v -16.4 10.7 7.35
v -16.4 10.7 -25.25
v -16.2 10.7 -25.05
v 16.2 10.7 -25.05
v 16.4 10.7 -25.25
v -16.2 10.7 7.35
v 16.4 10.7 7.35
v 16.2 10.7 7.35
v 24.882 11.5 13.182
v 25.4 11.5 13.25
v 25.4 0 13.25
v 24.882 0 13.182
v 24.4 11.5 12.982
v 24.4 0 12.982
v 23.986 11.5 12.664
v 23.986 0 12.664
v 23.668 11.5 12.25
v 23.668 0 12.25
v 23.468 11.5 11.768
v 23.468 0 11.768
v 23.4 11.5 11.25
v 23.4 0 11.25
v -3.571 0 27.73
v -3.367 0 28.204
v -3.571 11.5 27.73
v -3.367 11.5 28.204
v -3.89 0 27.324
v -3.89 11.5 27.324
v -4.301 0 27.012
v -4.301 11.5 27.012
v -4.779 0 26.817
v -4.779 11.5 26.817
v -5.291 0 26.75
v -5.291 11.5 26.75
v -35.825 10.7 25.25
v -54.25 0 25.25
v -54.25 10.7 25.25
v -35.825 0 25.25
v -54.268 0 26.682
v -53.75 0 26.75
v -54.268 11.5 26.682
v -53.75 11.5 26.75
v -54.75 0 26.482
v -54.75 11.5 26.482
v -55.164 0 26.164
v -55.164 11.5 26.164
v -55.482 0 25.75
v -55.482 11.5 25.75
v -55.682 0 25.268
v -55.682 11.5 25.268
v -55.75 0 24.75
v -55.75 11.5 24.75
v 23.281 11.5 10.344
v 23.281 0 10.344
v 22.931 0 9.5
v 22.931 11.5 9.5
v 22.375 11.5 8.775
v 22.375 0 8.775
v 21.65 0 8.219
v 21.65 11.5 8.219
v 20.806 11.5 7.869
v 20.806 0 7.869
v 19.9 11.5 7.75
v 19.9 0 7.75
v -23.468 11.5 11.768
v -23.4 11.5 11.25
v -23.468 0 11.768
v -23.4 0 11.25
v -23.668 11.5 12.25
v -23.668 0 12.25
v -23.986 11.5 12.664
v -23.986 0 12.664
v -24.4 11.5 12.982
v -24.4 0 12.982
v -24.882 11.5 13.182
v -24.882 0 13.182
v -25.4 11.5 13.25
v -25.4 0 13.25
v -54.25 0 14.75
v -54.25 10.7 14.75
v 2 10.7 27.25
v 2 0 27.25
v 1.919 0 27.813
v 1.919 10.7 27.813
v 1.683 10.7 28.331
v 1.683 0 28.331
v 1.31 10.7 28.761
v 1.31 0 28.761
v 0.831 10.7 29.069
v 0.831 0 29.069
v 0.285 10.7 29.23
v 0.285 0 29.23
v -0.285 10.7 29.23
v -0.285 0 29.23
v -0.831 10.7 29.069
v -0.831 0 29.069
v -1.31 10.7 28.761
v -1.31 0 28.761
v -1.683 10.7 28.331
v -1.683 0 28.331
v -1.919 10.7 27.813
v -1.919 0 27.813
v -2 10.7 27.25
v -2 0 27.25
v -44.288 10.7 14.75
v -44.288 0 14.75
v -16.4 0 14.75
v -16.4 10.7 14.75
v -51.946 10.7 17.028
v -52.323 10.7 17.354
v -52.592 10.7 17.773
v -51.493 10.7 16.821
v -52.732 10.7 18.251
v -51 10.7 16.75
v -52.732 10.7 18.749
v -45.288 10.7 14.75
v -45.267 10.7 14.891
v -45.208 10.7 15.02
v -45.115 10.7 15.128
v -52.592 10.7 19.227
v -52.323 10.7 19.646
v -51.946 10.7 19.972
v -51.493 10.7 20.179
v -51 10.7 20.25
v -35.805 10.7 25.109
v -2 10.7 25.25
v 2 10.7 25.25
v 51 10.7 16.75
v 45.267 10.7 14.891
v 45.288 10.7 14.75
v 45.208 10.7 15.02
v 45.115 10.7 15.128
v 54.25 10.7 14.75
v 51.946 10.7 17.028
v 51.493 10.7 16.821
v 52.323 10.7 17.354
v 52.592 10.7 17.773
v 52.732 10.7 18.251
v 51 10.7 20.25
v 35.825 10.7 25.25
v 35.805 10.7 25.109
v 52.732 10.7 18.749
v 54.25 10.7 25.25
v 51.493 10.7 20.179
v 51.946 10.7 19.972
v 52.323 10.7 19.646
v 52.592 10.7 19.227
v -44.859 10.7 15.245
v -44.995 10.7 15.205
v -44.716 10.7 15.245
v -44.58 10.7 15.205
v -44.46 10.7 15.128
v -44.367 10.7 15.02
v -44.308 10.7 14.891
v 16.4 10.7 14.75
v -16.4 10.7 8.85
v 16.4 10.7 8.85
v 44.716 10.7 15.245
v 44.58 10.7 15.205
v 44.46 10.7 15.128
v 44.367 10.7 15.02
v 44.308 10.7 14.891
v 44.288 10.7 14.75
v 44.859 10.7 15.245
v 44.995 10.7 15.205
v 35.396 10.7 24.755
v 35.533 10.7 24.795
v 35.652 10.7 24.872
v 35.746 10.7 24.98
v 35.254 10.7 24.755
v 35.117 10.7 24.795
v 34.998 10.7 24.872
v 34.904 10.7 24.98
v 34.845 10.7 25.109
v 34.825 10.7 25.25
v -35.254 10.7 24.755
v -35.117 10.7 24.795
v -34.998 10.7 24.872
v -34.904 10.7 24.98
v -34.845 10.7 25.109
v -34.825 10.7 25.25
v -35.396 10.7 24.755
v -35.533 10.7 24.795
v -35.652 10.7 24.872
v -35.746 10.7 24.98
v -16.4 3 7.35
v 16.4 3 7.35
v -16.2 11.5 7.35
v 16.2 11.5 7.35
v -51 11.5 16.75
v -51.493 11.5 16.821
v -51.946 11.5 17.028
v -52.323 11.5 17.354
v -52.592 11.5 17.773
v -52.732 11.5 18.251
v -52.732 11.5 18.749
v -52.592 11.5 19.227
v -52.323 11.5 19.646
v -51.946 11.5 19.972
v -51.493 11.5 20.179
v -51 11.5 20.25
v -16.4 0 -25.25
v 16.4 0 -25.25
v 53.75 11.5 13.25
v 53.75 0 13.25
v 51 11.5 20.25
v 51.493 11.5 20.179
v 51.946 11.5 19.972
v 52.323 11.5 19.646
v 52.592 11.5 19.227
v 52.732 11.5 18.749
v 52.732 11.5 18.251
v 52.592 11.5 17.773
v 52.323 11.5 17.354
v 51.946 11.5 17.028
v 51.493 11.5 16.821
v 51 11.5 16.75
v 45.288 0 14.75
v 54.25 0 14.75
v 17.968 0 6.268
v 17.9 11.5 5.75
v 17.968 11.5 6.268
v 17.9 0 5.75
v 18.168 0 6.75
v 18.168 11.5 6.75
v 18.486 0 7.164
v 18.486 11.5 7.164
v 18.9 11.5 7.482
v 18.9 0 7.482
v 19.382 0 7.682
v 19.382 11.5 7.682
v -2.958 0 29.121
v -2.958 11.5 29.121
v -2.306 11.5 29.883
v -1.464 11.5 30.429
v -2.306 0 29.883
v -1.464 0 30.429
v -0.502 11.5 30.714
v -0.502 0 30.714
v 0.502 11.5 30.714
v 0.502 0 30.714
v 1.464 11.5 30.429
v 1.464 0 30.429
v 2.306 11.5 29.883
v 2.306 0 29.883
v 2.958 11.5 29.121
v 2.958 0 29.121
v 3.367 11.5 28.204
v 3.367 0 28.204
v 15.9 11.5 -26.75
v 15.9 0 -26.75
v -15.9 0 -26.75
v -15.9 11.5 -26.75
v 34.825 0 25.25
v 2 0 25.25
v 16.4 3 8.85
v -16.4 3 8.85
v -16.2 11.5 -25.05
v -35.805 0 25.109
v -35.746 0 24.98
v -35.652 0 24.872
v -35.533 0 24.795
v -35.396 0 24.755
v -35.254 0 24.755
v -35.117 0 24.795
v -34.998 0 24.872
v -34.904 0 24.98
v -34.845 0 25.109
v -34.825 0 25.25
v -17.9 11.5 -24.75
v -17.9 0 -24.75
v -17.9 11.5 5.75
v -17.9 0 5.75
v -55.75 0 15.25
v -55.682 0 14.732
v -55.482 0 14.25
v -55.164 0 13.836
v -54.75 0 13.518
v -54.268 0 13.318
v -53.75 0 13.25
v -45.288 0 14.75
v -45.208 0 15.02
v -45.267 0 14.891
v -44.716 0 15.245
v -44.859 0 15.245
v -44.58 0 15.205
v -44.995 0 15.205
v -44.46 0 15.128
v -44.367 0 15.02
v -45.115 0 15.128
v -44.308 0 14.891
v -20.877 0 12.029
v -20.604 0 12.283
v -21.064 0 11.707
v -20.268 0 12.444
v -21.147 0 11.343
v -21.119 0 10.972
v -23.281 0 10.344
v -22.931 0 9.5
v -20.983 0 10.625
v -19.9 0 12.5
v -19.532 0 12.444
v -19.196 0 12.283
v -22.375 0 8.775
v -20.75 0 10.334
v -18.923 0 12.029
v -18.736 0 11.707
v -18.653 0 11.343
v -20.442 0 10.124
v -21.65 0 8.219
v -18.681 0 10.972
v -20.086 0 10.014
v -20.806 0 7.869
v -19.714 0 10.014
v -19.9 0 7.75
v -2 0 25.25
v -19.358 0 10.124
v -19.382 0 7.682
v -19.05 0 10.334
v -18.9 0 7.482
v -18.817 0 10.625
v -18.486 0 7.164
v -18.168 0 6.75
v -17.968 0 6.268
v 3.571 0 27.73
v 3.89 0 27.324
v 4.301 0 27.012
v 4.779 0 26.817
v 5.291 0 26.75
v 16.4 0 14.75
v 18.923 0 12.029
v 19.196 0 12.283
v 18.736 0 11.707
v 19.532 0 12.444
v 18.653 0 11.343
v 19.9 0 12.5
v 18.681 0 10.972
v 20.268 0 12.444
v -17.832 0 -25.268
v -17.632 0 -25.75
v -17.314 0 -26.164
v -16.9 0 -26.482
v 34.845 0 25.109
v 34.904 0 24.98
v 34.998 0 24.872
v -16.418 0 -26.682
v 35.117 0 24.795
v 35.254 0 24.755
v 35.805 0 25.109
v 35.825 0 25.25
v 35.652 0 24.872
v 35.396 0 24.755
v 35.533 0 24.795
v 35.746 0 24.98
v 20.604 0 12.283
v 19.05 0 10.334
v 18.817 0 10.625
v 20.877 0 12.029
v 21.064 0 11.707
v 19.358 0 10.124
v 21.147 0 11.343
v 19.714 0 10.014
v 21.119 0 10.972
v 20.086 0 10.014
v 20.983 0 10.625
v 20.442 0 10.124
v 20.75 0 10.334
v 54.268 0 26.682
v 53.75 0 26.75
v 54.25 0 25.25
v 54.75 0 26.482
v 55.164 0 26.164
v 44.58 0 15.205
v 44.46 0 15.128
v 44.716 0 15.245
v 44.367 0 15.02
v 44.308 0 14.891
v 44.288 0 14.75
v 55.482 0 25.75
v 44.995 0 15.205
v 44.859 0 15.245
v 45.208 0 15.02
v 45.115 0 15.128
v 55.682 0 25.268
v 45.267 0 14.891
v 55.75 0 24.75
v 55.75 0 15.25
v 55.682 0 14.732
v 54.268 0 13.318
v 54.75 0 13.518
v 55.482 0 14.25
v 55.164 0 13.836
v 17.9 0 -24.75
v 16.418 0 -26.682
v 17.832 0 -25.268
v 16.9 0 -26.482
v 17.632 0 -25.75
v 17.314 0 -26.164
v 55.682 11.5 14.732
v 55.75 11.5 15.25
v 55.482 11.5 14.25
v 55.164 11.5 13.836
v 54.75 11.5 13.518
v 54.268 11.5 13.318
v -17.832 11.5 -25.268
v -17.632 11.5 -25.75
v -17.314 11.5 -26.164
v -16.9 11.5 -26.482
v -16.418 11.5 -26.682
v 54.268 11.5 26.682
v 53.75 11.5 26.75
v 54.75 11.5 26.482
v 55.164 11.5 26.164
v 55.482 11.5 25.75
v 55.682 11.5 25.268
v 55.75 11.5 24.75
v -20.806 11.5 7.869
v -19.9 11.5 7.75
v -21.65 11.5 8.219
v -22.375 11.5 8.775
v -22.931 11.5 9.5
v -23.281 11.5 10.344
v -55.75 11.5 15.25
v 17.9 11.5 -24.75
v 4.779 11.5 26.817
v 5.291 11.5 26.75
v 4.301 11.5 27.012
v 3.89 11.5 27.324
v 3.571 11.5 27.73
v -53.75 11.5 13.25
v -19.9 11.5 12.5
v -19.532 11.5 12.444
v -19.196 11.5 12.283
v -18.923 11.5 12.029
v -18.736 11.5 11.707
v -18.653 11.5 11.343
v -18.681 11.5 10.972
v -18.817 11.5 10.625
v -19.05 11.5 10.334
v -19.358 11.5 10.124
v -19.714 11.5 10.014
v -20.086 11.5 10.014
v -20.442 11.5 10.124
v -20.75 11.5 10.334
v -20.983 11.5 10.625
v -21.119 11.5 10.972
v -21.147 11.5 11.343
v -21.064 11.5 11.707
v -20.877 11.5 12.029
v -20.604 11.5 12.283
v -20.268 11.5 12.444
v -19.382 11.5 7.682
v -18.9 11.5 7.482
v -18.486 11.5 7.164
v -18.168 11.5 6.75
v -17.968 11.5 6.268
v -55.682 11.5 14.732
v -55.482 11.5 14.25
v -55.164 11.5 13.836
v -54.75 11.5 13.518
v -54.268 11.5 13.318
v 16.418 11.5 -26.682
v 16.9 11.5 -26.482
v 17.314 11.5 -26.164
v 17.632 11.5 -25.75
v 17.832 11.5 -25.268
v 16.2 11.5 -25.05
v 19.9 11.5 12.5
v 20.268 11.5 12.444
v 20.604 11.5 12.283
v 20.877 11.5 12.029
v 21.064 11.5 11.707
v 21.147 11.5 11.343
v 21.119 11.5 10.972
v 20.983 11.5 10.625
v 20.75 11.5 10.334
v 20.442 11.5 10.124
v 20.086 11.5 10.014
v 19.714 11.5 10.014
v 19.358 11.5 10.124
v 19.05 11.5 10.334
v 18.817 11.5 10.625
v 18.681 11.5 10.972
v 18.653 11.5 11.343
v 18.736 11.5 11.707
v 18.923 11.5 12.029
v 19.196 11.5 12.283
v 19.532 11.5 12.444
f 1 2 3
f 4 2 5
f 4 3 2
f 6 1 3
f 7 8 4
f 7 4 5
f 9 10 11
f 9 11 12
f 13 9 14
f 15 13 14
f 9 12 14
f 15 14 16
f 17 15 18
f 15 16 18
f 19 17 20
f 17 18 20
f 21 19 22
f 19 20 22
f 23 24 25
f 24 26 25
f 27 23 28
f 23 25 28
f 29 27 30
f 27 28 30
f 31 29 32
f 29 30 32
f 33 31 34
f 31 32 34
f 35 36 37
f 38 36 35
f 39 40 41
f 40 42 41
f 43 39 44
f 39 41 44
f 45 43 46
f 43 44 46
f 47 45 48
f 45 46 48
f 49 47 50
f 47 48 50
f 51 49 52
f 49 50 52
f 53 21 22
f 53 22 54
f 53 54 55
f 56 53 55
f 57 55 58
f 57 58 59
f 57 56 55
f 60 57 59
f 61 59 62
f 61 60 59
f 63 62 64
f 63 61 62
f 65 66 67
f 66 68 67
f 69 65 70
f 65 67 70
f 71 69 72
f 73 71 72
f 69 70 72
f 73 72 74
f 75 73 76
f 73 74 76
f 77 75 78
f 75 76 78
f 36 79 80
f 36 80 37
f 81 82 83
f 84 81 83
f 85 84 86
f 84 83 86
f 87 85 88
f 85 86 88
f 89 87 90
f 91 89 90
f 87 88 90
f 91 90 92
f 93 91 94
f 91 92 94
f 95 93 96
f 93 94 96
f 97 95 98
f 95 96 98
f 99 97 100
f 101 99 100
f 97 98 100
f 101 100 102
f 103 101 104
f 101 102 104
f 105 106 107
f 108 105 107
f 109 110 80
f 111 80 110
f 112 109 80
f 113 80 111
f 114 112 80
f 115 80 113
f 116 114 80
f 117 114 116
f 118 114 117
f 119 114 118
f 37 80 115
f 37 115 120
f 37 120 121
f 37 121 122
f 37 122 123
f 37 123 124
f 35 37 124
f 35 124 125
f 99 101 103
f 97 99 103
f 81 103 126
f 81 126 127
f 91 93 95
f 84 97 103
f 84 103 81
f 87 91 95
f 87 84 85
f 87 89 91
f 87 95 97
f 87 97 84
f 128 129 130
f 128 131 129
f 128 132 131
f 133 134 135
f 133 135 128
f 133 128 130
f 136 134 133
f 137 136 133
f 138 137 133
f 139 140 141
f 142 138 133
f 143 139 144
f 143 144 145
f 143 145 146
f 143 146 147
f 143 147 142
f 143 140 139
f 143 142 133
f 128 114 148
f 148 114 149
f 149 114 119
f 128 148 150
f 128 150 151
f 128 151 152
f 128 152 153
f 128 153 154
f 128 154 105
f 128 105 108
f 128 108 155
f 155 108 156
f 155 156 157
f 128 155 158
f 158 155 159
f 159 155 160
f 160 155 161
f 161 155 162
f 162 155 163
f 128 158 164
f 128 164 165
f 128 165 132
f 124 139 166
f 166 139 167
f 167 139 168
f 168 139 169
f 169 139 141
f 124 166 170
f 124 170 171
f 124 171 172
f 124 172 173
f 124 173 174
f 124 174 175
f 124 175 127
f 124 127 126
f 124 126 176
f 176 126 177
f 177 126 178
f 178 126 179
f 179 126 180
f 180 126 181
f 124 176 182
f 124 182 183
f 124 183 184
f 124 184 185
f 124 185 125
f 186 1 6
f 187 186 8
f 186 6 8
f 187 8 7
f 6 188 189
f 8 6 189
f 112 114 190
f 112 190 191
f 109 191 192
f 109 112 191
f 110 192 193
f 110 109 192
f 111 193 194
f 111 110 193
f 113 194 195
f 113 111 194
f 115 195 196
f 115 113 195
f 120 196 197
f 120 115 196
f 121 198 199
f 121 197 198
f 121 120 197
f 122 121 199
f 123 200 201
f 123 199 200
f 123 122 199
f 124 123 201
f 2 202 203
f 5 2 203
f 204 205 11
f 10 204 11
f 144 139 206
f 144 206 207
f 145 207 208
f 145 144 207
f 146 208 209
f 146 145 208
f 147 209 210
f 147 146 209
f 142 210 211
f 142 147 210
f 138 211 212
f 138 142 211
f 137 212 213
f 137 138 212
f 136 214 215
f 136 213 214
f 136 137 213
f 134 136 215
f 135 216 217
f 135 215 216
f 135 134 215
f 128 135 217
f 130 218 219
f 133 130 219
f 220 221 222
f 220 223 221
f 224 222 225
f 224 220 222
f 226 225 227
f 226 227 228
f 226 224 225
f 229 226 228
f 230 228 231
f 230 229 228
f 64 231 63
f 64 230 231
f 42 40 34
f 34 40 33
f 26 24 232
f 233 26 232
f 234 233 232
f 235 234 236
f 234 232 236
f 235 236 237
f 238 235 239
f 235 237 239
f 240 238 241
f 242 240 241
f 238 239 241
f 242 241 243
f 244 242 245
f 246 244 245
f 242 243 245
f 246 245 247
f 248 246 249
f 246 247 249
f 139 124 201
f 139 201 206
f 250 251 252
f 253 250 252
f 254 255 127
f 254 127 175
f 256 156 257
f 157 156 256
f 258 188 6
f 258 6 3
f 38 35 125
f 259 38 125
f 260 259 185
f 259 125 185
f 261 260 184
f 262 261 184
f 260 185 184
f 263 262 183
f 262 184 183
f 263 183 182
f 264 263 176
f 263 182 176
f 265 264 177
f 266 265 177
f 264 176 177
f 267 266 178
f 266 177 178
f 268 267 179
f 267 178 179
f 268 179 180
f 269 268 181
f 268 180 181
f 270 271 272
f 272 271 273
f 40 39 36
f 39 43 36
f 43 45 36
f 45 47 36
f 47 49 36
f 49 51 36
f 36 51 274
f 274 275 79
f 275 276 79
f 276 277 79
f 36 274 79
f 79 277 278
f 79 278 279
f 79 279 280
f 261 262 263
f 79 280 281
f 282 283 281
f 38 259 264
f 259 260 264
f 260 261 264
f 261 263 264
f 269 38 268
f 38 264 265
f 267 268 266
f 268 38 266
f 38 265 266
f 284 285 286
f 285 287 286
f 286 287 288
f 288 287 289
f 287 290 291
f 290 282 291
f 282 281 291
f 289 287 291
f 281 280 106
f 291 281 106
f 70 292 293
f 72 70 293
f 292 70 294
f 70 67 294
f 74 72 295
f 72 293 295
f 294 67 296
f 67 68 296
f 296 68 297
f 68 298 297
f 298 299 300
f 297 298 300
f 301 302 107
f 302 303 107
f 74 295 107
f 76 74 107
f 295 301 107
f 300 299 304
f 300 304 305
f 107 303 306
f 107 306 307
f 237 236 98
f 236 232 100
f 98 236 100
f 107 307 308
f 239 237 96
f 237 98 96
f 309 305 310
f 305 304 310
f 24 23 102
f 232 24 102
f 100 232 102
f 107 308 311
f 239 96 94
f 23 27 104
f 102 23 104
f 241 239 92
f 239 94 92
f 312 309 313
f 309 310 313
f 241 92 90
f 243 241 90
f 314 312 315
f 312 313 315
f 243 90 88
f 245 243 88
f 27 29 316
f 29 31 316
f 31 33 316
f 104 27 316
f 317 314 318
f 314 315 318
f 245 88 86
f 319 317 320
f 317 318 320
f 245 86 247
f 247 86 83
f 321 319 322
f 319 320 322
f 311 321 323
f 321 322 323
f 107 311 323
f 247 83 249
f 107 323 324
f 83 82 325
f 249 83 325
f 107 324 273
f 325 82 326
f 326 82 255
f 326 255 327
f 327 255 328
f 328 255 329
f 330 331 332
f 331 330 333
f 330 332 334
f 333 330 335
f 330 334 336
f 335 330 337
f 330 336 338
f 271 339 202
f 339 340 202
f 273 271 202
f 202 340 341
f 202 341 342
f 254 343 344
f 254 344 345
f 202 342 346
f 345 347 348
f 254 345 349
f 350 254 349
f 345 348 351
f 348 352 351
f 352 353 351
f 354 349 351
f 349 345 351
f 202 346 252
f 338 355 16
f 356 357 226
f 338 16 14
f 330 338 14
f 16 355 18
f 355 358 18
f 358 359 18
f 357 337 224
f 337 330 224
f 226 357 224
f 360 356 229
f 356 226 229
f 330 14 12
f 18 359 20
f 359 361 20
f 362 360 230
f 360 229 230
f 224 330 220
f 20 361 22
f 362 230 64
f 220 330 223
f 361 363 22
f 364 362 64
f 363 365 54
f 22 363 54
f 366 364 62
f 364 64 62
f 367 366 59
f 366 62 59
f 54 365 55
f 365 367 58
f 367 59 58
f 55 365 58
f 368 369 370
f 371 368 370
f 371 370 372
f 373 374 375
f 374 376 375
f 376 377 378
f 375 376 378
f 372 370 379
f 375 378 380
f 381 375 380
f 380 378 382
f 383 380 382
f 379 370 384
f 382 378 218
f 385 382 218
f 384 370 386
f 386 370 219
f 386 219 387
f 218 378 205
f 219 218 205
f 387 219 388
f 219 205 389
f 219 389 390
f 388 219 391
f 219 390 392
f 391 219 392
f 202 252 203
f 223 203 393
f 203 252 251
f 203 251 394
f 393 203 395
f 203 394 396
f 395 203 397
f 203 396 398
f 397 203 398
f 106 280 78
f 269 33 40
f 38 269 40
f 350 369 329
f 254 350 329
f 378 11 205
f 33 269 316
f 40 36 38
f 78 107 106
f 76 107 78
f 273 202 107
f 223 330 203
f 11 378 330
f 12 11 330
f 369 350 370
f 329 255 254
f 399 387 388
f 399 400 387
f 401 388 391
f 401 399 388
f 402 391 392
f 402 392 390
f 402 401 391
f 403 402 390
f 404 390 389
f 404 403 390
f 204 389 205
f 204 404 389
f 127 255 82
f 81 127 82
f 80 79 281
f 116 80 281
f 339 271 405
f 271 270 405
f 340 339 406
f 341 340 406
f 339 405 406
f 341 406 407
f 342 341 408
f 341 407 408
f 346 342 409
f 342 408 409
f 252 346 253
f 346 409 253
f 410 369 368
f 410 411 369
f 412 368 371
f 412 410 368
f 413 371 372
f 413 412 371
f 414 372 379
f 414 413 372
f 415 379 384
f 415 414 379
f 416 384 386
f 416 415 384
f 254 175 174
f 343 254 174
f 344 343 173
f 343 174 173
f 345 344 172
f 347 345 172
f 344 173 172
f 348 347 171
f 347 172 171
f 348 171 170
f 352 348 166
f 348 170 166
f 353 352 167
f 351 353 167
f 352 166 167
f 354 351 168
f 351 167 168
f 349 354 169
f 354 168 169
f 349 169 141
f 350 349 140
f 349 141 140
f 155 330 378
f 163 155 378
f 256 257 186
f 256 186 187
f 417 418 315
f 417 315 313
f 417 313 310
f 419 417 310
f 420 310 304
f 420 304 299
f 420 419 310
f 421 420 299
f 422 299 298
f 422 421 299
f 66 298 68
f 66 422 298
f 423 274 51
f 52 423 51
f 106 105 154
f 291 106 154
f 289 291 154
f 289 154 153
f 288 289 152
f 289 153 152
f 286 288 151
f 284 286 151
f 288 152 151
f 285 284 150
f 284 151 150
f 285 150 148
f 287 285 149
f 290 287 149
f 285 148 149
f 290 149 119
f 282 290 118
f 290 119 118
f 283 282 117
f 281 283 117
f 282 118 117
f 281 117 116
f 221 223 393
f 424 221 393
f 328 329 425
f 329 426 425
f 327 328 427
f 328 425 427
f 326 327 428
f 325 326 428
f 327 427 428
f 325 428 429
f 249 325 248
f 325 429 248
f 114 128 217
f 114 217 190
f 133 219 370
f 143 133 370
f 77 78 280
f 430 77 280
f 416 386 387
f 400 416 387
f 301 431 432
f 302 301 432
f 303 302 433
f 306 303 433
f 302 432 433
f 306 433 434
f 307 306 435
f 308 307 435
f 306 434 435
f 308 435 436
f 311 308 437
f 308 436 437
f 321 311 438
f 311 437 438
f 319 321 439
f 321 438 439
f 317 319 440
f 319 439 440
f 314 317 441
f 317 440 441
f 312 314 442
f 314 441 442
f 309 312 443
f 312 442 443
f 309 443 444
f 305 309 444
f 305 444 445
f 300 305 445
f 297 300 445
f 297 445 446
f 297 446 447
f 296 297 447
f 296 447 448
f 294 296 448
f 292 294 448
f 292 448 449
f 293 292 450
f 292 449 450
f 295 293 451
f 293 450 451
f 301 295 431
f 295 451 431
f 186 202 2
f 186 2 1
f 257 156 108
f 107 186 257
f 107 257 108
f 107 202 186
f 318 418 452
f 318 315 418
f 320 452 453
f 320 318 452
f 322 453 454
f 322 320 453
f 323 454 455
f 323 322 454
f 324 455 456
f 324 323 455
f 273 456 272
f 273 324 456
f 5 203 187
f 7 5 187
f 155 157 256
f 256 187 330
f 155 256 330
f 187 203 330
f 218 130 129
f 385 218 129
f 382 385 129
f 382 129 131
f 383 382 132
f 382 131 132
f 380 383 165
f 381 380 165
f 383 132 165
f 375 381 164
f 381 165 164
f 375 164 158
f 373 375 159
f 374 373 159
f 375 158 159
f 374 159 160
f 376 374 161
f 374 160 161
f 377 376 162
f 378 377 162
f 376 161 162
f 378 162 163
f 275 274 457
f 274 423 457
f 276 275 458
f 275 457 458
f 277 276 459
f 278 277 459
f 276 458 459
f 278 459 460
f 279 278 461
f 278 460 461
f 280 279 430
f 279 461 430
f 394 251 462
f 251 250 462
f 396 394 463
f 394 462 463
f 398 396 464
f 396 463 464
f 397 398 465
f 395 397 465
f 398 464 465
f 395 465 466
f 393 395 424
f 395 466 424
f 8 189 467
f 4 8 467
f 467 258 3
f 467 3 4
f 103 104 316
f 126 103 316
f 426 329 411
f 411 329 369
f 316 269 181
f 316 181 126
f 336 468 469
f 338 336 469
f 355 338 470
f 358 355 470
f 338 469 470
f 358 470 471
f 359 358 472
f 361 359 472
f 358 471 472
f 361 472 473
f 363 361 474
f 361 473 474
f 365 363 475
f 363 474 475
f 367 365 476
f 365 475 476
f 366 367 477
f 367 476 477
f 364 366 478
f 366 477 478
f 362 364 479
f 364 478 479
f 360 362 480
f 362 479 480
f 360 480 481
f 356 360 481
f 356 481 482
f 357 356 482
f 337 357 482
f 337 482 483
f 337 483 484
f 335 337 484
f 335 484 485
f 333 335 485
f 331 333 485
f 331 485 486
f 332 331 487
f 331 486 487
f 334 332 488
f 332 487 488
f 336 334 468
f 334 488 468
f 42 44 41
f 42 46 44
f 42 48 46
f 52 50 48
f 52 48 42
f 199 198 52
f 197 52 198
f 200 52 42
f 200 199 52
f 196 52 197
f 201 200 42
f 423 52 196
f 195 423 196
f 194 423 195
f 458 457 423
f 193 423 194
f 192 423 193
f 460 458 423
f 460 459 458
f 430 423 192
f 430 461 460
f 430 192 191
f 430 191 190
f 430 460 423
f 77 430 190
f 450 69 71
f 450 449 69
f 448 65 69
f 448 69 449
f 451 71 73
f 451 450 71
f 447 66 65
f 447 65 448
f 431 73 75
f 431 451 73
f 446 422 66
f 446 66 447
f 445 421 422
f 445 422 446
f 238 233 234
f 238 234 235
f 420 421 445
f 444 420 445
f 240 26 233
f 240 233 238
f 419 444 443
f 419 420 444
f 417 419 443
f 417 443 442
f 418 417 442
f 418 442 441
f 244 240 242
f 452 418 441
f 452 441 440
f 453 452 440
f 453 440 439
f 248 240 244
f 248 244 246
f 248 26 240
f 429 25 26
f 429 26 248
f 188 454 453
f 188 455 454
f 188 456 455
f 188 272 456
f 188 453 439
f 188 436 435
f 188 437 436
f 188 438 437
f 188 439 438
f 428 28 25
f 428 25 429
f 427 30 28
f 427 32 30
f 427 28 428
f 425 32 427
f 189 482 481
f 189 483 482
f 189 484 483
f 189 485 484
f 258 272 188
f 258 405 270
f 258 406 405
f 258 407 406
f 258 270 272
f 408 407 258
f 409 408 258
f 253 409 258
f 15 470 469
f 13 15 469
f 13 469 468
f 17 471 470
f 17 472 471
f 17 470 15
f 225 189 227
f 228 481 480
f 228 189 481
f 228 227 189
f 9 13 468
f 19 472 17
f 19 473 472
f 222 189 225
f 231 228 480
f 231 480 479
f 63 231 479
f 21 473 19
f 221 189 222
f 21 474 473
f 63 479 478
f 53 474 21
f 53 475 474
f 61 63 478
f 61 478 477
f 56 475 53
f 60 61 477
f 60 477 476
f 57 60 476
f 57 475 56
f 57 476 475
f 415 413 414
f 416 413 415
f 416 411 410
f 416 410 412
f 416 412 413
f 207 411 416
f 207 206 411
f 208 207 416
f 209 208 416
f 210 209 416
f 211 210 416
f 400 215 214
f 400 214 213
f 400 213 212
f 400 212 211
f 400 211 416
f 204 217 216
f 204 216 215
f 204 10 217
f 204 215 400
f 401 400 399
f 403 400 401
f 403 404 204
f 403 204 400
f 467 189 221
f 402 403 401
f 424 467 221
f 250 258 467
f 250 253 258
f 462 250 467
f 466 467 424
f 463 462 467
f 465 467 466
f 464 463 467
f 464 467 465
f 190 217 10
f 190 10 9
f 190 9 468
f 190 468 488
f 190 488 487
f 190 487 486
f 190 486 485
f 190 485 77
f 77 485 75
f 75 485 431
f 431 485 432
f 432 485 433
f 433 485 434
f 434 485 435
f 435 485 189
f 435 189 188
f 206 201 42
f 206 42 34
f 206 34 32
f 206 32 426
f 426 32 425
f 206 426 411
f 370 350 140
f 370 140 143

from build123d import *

# Parameters (mm, degrees)
BOSS_EXTRUDE1_DEPTH = 11.5
SKETCH2_W           = 32.4
SKETCH2_H           = 32.4
CUT_EXTRUDE1_DEPTH  = 8.7
SKETCH3_R           = 2
SKETCH3_W           = 108.5
SKETCH3_H           = 10.5
CUT_EXTRUDE2_DEPTH  = 10.7
CUT_EXTRUDE3_REACH  = 66.561
SKETCH5_W           = 32.8
SKETCH5_H           = 40
CUT_EXTRUDE4_DEPTH  = 10.7
SKETCH6_W           = 32.8
SKETCH6_H           = 1.5
BOSS_EXTRUDE2_DEPTH = 7.7
SKETCH8_R           = 2
SKETCH8_R_2         = 1.25
BOSS_EXTRUDE5_DEPTH = 11.5
FILLET1_R           = 2
SKETCH9_R           = 0.5
BOSS_EXTRUDE6_DEPTH = 10.7


with BuildPart() as part:
    # Sketch1 → Boss-Extrude1 (new body)
    with BuildSketch(Plane(origin=(0, 0, 0), x_dir=(1, 0, 0), z_dir=(0, 1, 0))):
        with BuildLine():
            Line((3.464101615, -26.75), (55.75, -26.75))
            Line((55.75, -26.75), (55.75, -13.25))
            Line((55.75, -13.25), (17.9, -13.25))
            Line((17.9, -13.25), (17.9, 26.75))
            Line((17.9, 26.75), (-17.9, 26.75))
            Line((-17.9, 26.75), (-17.9, -13.25))
            Line((-17.9, -13.25), (-55.75, -13.25))
            Line((-55.75, -13.25), (-55.75, -26.75))
            Line((-55.75, -26.75), (-3.464101615, -26.75))
            ThreePointArc((-3.464101615, -26.75), (0, -30.75), (3.464101615, -26.75))
        make_face()
    extrude(amount=BOSS_EXTRUDE1_DEPTH)

    # Sketch2 → Cut-Extrude1 (cut)
    with BuildSketch(Plane(origin=(0, 11.5, 0), x_dir=(1, 0, 0), z_dir=(0, 1, 0))):
        with Locations((0, 8.85)):
            Rectangle(SKETCH2_W, SKETCH2_H)
    extrude(amount=-CUT_EXTRUDE1_DEPTH, mode=Mode.SUBTRACT)

    # Sketch3 → Cut-Extrude2 (cut)
    with BuildSketch(Plane.XZ):
        with Locations((0, 27.25)):
            Circle(SKETCH3_R)
        with BuildLine():
            Line((-2, 27.25), (-2, 25.25))
            Line((-2, 25.25), (-1e-08, 25.25))
            ThreePointArc((-1e-08, 25.25), (-1.414213566, 25.835786441), (-2, 27.25))
        make_face()
        with BuildLine():
            ThreePointArc((2, 27.25), (1.414213559, 25.835786434), (-1e-08, 25.25))
            Line((-1e-08, 25.25), (2, 25.25))
            Line((2, 25.25), (2, 27.25))
        make_face()
        with Locations((0, 20)):
            Rectangle(SKETCH3_W, SKETCH3_H)
    extrude(amount=-CUT_EXTRUDE2_DEPTH, mode=Mode.SUBTRACT)

    # Sketch4 → Cut-Extrude3 (cut, up to next)
    with BuildSketch(Plane.XZ.offset(-10.7), mode=Mode.PRIVATE) as cut_extrude3_sk1:
        with BuildLine():
            Line((51, 16.75), (-51, 16.75))
            ThreePointArc((-51, 16.75), (-52.75, 18.5), (-51, 20.25))
            Line((-51, 20.25), (51, 20.25))
            ThreePointArc((51, 20.25), (52.75, 18.5), (51, 16.75))
        make_face()
    cut_extrude3_tool1 = extrude(cut_extrude3_sk1.sketch, amount=-CUT_EXTRUDE3_REACH, mode=Mode.PRIVATE) & part.part
    add(cut_extrude3_tool1.solids().sort_by_distance((0, 10.7, 18.5))[0], mode=Mode.SUBTRACT)

    # Sketch5 → Cut-Extrude4 (cut)
    with BuildSketch(Plane.XZ):
        with Locations((0, -5.25)):
            Rectangle(SKETCH5_W, SKETCH5_H)
    extrude(amount=-CUT_EXTRUDE4_DEPTH, mode=Mode.SUBTRACT)

    # Sketch6 → Boss-Extrude2 (add)
    with BuildSketch(Plane.XZ.offset(-10.7)):
        with Locations((0, 8.1)):
            Rectangle(SKETCH6_W, SKETCH6_H)
    extrude(amount=BOSS_EXTRUDE2_DEPTH)

    # Sketch8 → Boss-Extrude5 (add)
    # profile 1 of 10: a face of its own
    with BuildSketch(Plane(origin=(0, 11.5, 0), x_dir=(1, 0, 0), z_dir=(0, 1, 0))):
        with BuildLine():
            Line((-17.9, -7.75), (-19.9, -7.75))
            ThreePointArc((-19.9, -7.75), (-18.851902827, -7.910614979), (-17.9, -8.377718677))
            Line((-17.9, -8.377718677), (-17.9, -7.75))
        make_face()
    # profile 2 of 10: a face of its own
    with BuildSketch(Plane(origin=(0, 11.5, 0), x_dir=(1, 0, 0), z_dir=(0, 1, 0))):
        with BuildLine():
            ThreePointArc((-17.9, -8.377718677), (-18.851902827, -7.910614979), (-19.9, -7.75))
            ThreePointArc((-19.9, -7.75), (-22.374873734, -8.775126266), (-23.4, -11.25))
            ThreePointArc((-23.4, -11.25), (-23.239385021, -12.298097173), (-22.772281323, -13.25))
            Line((-22.772281323, -13.25), (-19.9, -13.25))
            ThreePointArc((-19.9, -13.25), (-21.314213562, -9.835786438), (-17.9, -11.25))
            Line((-17.9, -11.25), (-17.9, -8.377718677))
        make_face()
    # profile 3 of 10: a face of its own
    with BuildSketch(Plane(origin=(0, 11.5, 0), x_dir=(1, 0, 0), z_dir=(0, 1, 0))):
        with Locations((-19.9, -11.25)):
            Circle(SKETCH8_R)
        with Locations(Location((-19.9, -11.25, 0), (0, 0, 270))):
            Circle(SKETCH8_R_2, mode=Mode.SUBTRACT)
    # profile 4 of 10: a face of its own
    with BuildSketch(Plane(origin=(0, 11.5, 0), x_dir=(1, 0, 0), z_dir=(0, 1, 0))):
        with BuildLine():
            Line((-17.9, -13.25), (-17.9, -11.25))
            ThreePointArc((-17.9, -11.25), (-18.485786438, -12.664213562), (-19.9, -13.25))
            Line((-19.9, -13.25), (-17.9, -13.25))
        make_face()
    # profile 5 of 10: a face of its own
    with BuildSketch(Plane(origin=(0, 11.5, 0), x_dir=(1, 0, 0), z_dir=(0, 1, 0))):
        with BuildLine():
            ThreePointArc((-22.772281323, -13.25), (-23.239385021, -12.298097173), (-23.4, -11.25))
            Line((-23.4, -11.25), (-23.4, -13.25))
            Line((-23.4, -13.25), (-22.772281323, -13.25))
        make_face()
    # profile 6 of 10: a face of its own
    with BuildSketch(Plane(origin=(0, 11.5, 0), x_dir=(1, 0, 0), z_dir=(0, 1, 0))):
        with BuildLine():
            Line((17.9, -13.25), (19.9, -13.25))
            ThreePointArc((19.9, -13.25), (18.485786438, -12.664213562), (17.9, -11.25))
            Line((17.9, -11.25), (17.9, -13.25))
        make_face()
    # profile 7 of 10: a face of its own
    with BuildSketch(Plane(origin=(0, 11.5, 0), x_dir=(1, 0, 0), z_dir=(0, 1, 0))):
        with Locations((19.9, -11.25)):
            Circle(SKETCH8_R)
        with Locations(Location((19.9, -11.25, 0), (0, 0, 270))):
            Circle(SKETCH8_R_2, mode=Mode.SUBTRACT)
    # profile 8 of 10: a face of its own
    with BuildSketch(Plane(origin=(0, 11.5, 0), x_dir=(1, 0, 0), z_dir=(0, 1, 0))):
        with BuildLine():
            ThreePointArc((22.772281323, -13.25), (23.239385021, -12.298097173), (23.4, -11.25))
            ThreePointArc((23.4, -11.25), (22.374873734, -8.775126266), (19.9, -7.75))
            ThreePointArc((19.9, -7.75), (18.851902827, -7.910614979), (17.9, -8.377718677))
            Line((17.9, -8.377718677), (17.9, -11.25))
            ThreePointArc((17.9, -11.25), (19.9, -9.25), (21.9, -11.25))
            ThreePointArc((21.9, -11.25), (21.314213562, -12.664213562), (19.9, -13.25))
            Line((19.9, -13.25), (22.772281323, -13.25))
        make_face()
    # profile 9 of 10: a face of its own
    with BuildSketch(Plane(origin=(0, 11.5, 0), x_dir=(1, 0, 0), z_dir=(0, 1, 0))):
        with BuildLine():
            ThreePointArc((17.9, -8.377718677), (18.851902827, -7.910614979), (19.9, -7.75))
            Line((19.9, -7.75), (17.9, -7.75))
            Line((17.9, -7.75), (17.9, -8.377718677))
        make_face()
    # profile 10 of 10: a face of its own
    with BuildSketch(Plane(origin=(0, 11.5, 0), x_dir=(1, 0, 0), z_dir=(0, 1, 0))):
        with BuildLine():
            Line((23.4, -13.25), (23.4, -11.25))
            ThreePointArc((23.4, -11.25), (23.239385021, -12.298097173), (22.772281323, -13.25))
            Line((22.772281323, -13.25), (23.4, -13.25))
        make_face()
    extrude(amount=-BOSS_EXTRUDE5_DEPTH)

    # Fillet1
    fillet1_edges = [part.edges().sort_by_distance(p)[0] for p in [
        (55.75, 5.75, 26.75),
        (55.75, 5.75, 13.25),
        (-55.75, 5.75, 26.75),
        (-55.75, 5.75, 13.25),
        (-17.9, 5.75, -26.75),
        (17.9, 5.75, -26.75),
        (-17.9, 5.75, 7.75),
        (-23.4, 5.75, 13.25),
        (23.4, 5.75, 13.25),
        (17.9, 5.75, 7.75),
        (3.464101615, 5.75, 26.75),
        (-3.464101615, 5.75, 26.75),
    ]]
    fillet(fillet1_edges, radius=FILLET1_R - 0.0001)  # a hair under: the kernel refuses the full size

    # Sketch9 → Boss-Extrude6 (add)
    with BuildSketch(Plane.XZ.offset(-10.7)):
        with Locations((-35.325, 25.25)):
            Circle(SKETCH9_R)
        with Locations((-44.7875, 14.75)):
            Circle(SKETCH9_R)
        with Locations((35.325, 25.25)):
            Circle(SKETCH9_R)
        with Locations((44.7875, 14.75)):
            Circle(SKETCH9_R)
    extrude(amount=BOSS_EXTRUDE6_DEPTH)


solid = part.part
